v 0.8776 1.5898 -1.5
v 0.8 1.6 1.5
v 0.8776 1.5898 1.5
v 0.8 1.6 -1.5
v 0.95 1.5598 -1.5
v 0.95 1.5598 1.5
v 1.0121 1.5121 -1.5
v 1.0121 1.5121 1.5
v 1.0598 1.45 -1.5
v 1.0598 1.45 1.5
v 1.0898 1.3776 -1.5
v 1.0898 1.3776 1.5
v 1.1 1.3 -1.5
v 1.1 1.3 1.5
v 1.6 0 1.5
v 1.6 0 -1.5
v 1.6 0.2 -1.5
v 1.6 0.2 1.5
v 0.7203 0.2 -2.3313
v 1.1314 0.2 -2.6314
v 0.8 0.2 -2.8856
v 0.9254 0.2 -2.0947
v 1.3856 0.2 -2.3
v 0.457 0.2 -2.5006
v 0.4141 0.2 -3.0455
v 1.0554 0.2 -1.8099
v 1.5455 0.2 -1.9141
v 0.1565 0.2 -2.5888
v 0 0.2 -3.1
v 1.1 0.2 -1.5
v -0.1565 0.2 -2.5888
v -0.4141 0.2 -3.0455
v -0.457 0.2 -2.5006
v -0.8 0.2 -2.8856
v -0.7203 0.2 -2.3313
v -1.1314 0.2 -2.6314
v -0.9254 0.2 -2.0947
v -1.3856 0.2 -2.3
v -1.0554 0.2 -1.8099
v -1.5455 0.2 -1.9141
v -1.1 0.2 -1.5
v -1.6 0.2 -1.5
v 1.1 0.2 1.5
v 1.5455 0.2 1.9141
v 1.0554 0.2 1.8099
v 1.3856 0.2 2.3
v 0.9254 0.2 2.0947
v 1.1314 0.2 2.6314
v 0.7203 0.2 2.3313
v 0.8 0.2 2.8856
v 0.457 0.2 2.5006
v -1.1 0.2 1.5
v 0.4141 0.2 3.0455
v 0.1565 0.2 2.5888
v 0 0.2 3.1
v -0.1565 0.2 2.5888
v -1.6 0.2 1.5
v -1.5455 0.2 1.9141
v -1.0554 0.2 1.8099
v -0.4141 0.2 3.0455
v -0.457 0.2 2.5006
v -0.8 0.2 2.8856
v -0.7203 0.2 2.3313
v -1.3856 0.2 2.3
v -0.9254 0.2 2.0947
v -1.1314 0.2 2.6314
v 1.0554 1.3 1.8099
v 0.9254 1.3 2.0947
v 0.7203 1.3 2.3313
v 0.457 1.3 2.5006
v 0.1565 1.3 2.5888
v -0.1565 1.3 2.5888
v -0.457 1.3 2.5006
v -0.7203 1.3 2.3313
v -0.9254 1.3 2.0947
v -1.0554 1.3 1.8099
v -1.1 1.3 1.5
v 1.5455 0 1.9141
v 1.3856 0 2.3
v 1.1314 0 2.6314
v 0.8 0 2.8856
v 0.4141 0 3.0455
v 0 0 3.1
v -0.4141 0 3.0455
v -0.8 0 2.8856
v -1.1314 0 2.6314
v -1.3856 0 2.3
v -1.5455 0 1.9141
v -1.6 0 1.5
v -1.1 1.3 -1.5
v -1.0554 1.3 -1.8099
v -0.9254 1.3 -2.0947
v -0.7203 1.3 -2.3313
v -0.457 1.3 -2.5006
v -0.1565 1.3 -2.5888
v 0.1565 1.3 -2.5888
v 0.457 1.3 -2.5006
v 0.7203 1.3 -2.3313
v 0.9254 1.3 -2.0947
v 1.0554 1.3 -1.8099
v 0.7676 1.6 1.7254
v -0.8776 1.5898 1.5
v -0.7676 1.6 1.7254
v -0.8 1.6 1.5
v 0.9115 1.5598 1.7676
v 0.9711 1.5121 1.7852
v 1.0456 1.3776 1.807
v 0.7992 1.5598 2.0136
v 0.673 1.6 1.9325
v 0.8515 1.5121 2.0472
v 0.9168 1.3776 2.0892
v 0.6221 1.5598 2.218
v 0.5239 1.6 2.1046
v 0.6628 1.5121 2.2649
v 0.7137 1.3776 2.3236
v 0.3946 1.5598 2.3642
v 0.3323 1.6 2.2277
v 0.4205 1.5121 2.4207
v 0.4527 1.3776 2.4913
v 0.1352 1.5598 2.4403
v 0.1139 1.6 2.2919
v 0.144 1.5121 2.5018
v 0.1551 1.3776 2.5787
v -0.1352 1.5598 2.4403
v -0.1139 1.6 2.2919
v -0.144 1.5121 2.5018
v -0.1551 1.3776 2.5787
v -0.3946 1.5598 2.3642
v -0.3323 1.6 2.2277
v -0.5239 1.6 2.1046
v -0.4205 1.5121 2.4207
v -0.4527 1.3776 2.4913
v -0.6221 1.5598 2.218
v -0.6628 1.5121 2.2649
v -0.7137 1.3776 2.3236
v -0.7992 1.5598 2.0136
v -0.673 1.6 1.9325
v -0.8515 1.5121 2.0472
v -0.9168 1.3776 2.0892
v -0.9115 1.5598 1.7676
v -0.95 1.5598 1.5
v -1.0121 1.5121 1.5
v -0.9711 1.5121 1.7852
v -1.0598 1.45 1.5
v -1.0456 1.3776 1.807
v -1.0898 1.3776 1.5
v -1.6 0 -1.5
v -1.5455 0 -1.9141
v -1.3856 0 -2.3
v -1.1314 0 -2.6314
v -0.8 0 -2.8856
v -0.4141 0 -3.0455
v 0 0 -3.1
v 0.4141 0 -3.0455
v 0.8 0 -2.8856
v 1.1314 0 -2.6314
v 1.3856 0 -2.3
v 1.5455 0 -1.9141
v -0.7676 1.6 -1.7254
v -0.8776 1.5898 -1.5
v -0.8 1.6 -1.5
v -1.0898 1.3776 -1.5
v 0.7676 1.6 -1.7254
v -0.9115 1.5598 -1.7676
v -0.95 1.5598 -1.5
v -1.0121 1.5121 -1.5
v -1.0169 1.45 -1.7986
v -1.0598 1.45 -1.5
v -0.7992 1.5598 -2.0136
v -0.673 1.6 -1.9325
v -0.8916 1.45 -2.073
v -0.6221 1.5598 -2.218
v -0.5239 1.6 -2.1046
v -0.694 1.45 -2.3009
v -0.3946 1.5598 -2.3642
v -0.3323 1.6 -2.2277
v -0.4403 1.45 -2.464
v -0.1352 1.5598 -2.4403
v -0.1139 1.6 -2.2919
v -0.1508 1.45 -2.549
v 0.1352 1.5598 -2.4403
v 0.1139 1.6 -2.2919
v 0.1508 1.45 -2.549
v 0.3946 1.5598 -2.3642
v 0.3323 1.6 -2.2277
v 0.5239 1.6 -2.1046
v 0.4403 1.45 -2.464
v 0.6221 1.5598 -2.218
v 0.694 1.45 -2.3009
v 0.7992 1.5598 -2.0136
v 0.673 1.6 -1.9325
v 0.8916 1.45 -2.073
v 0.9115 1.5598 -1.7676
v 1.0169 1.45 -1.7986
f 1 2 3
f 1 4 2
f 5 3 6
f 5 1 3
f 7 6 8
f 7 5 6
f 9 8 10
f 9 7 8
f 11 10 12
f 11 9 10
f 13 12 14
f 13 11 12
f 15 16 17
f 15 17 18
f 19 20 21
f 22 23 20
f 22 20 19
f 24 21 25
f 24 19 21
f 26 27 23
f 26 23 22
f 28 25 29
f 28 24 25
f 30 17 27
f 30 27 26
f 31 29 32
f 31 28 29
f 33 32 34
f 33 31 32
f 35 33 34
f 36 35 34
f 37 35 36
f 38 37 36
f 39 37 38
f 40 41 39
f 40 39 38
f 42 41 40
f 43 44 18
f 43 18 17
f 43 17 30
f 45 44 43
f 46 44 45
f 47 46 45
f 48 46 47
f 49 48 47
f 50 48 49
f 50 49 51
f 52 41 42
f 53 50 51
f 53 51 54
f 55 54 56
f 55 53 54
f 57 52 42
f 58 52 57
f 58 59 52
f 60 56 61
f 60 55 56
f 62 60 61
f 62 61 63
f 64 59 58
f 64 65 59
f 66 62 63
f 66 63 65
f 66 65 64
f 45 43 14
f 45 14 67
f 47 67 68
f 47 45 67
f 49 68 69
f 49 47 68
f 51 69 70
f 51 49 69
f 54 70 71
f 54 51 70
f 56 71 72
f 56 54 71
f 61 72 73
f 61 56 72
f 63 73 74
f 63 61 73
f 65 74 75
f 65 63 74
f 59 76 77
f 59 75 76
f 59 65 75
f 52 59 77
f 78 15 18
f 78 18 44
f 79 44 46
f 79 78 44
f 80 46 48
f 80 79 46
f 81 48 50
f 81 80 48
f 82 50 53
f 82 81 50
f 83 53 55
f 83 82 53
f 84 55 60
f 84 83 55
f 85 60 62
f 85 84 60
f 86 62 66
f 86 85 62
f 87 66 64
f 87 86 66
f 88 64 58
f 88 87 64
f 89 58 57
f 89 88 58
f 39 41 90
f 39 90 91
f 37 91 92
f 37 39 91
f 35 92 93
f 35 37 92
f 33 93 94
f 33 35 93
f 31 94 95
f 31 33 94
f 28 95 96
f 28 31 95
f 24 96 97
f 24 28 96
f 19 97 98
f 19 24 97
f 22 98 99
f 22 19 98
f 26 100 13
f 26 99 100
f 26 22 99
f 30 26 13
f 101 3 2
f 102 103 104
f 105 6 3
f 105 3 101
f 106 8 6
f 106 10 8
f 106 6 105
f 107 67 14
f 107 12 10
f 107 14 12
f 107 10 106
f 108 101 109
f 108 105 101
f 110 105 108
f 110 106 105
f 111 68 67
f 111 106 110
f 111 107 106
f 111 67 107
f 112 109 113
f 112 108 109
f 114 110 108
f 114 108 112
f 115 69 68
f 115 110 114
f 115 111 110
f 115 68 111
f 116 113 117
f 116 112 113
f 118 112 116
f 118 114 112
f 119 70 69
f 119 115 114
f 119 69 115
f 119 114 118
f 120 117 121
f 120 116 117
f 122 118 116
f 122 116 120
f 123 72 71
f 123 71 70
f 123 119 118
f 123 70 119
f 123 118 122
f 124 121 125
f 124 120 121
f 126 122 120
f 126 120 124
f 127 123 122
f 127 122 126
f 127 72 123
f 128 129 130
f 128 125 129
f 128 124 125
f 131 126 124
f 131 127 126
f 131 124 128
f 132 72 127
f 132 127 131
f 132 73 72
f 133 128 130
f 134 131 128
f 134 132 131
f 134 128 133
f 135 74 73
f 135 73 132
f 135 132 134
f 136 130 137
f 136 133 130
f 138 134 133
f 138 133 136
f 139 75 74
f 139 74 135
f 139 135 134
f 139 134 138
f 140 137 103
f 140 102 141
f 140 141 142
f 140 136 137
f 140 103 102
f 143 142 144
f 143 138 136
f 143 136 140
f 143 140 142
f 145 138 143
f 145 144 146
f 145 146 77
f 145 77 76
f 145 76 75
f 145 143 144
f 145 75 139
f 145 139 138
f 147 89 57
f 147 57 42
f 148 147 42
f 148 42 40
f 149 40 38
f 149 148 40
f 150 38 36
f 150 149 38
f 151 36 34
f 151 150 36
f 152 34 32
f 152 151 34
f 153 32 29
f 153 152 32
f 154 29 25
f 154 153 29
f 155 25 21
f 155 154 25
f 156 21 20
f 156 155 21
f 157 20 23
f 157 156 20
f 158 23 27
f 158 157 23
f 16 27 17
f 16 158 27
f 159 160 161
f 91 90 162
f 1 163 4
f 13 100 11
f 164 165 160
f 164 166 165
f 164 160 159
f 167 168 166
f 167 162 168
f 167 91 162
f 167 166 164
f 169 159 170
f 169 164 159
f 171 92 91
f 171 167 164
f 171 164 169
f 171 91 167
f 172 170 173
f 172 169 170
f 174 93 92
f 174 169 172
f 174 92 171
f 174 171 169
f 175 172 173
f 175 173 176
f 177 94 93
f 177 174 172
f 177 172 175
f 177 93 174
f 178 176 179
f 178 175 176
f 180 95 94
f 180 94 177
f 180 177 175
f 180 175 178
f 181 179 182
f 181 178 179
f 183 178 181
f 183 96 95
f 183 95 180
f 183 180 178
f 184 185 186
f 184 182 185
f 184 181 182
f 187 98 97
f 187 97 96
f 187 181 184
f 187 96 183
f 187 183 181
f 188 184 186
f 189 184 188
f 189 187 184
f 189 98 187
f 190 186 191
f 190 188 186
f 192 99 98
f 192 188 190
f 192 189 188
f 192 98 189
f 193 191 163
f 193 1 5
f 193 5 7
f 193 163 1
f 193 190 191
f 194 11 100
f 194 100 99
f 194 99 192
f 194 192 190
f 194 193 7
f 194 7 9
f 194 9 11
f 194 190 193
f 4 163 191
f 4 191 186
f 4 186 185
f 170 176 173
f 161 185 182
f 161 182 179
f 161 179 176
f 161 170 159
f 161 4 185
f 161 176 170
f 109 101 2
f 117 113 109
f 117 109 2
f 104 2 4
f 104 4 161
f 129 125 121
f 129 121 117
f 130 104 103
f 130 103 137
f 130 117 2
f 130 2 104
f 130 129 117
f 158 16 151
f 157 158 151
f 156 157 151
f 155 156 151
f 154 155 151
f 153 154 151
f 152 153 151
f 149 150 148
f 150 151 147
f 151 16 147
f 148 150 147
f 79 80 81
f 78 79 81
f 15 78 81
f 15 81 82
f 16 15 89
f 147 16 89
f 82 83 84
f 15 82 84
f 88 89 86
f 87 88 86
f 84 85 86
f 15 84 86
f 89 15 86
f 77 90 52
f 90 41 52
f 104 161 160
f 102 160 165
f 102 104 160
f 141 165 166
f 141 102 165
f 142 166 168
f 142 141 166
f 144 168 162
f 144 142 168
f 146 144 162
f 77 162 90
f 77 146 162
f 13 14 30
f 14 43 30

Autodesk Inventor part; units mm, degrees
ref_plane "YZ Plane" through (0, 0, 0) normal (1, 0, 0) x (0, 1, 0)
ref_plane "XZ Plane" through (0, 0, 0) normal (0, 1, 0) x (-1, 0, 0)
ref_plane "XY Plane" through (0, 0, 0) normal (0, 0, 1) x (1, 0, 0)
sketch "Sketch1" plane through (0, 0, 0) normal (0, 1, 0) x (-1, 0, 0)
  line L0 (0, 1.5) -> (0, -1.5) construction
  line L1 (-1.1, 1.5) -> (-1.1, -1.5)
  line L2 (1.1, -1.5) -> (1.1, 1.5)
  arc A0 (1.1, 1.5) -> (-1.1, 1.5) centre (0, 1.5) ccw
  arc A1 (-1.1, -1.5) -> (1.1, -1.5) centre (0, -1.5) ccw
  line L3 (1.6, 1.5) -> (1.6, -1.5)
  arc A2 (-1.6, -1.5) -> (1.6, -1.5) centre (0, -1.5) ccw
  line L4 (-1.6, -1.5) -> (-1.6, 1.5)
  arc A3 (1.6, 1.5) -> (-1.6, 1.5) centre (0, 1.5) ccw
  point P0 (0, 0)
  dimension "d0" = 3
  dimension "d1" = 2.2
  dimension "d2" = 0.5
extrude "button" add sketch "Sketch1" along normal blind 1.6 contours A0 L2 A1 L1
extrude "base" add sketch "Sketch1" along normal blind 0.2
fillet "Fillet1" radius 0.3 4 edges at (0, 1.6, -2.6) (-1.1, 1.6, 0) (0, 1.6, 2.6) (1.1, 1.6, 0)
properties part number "Button"
